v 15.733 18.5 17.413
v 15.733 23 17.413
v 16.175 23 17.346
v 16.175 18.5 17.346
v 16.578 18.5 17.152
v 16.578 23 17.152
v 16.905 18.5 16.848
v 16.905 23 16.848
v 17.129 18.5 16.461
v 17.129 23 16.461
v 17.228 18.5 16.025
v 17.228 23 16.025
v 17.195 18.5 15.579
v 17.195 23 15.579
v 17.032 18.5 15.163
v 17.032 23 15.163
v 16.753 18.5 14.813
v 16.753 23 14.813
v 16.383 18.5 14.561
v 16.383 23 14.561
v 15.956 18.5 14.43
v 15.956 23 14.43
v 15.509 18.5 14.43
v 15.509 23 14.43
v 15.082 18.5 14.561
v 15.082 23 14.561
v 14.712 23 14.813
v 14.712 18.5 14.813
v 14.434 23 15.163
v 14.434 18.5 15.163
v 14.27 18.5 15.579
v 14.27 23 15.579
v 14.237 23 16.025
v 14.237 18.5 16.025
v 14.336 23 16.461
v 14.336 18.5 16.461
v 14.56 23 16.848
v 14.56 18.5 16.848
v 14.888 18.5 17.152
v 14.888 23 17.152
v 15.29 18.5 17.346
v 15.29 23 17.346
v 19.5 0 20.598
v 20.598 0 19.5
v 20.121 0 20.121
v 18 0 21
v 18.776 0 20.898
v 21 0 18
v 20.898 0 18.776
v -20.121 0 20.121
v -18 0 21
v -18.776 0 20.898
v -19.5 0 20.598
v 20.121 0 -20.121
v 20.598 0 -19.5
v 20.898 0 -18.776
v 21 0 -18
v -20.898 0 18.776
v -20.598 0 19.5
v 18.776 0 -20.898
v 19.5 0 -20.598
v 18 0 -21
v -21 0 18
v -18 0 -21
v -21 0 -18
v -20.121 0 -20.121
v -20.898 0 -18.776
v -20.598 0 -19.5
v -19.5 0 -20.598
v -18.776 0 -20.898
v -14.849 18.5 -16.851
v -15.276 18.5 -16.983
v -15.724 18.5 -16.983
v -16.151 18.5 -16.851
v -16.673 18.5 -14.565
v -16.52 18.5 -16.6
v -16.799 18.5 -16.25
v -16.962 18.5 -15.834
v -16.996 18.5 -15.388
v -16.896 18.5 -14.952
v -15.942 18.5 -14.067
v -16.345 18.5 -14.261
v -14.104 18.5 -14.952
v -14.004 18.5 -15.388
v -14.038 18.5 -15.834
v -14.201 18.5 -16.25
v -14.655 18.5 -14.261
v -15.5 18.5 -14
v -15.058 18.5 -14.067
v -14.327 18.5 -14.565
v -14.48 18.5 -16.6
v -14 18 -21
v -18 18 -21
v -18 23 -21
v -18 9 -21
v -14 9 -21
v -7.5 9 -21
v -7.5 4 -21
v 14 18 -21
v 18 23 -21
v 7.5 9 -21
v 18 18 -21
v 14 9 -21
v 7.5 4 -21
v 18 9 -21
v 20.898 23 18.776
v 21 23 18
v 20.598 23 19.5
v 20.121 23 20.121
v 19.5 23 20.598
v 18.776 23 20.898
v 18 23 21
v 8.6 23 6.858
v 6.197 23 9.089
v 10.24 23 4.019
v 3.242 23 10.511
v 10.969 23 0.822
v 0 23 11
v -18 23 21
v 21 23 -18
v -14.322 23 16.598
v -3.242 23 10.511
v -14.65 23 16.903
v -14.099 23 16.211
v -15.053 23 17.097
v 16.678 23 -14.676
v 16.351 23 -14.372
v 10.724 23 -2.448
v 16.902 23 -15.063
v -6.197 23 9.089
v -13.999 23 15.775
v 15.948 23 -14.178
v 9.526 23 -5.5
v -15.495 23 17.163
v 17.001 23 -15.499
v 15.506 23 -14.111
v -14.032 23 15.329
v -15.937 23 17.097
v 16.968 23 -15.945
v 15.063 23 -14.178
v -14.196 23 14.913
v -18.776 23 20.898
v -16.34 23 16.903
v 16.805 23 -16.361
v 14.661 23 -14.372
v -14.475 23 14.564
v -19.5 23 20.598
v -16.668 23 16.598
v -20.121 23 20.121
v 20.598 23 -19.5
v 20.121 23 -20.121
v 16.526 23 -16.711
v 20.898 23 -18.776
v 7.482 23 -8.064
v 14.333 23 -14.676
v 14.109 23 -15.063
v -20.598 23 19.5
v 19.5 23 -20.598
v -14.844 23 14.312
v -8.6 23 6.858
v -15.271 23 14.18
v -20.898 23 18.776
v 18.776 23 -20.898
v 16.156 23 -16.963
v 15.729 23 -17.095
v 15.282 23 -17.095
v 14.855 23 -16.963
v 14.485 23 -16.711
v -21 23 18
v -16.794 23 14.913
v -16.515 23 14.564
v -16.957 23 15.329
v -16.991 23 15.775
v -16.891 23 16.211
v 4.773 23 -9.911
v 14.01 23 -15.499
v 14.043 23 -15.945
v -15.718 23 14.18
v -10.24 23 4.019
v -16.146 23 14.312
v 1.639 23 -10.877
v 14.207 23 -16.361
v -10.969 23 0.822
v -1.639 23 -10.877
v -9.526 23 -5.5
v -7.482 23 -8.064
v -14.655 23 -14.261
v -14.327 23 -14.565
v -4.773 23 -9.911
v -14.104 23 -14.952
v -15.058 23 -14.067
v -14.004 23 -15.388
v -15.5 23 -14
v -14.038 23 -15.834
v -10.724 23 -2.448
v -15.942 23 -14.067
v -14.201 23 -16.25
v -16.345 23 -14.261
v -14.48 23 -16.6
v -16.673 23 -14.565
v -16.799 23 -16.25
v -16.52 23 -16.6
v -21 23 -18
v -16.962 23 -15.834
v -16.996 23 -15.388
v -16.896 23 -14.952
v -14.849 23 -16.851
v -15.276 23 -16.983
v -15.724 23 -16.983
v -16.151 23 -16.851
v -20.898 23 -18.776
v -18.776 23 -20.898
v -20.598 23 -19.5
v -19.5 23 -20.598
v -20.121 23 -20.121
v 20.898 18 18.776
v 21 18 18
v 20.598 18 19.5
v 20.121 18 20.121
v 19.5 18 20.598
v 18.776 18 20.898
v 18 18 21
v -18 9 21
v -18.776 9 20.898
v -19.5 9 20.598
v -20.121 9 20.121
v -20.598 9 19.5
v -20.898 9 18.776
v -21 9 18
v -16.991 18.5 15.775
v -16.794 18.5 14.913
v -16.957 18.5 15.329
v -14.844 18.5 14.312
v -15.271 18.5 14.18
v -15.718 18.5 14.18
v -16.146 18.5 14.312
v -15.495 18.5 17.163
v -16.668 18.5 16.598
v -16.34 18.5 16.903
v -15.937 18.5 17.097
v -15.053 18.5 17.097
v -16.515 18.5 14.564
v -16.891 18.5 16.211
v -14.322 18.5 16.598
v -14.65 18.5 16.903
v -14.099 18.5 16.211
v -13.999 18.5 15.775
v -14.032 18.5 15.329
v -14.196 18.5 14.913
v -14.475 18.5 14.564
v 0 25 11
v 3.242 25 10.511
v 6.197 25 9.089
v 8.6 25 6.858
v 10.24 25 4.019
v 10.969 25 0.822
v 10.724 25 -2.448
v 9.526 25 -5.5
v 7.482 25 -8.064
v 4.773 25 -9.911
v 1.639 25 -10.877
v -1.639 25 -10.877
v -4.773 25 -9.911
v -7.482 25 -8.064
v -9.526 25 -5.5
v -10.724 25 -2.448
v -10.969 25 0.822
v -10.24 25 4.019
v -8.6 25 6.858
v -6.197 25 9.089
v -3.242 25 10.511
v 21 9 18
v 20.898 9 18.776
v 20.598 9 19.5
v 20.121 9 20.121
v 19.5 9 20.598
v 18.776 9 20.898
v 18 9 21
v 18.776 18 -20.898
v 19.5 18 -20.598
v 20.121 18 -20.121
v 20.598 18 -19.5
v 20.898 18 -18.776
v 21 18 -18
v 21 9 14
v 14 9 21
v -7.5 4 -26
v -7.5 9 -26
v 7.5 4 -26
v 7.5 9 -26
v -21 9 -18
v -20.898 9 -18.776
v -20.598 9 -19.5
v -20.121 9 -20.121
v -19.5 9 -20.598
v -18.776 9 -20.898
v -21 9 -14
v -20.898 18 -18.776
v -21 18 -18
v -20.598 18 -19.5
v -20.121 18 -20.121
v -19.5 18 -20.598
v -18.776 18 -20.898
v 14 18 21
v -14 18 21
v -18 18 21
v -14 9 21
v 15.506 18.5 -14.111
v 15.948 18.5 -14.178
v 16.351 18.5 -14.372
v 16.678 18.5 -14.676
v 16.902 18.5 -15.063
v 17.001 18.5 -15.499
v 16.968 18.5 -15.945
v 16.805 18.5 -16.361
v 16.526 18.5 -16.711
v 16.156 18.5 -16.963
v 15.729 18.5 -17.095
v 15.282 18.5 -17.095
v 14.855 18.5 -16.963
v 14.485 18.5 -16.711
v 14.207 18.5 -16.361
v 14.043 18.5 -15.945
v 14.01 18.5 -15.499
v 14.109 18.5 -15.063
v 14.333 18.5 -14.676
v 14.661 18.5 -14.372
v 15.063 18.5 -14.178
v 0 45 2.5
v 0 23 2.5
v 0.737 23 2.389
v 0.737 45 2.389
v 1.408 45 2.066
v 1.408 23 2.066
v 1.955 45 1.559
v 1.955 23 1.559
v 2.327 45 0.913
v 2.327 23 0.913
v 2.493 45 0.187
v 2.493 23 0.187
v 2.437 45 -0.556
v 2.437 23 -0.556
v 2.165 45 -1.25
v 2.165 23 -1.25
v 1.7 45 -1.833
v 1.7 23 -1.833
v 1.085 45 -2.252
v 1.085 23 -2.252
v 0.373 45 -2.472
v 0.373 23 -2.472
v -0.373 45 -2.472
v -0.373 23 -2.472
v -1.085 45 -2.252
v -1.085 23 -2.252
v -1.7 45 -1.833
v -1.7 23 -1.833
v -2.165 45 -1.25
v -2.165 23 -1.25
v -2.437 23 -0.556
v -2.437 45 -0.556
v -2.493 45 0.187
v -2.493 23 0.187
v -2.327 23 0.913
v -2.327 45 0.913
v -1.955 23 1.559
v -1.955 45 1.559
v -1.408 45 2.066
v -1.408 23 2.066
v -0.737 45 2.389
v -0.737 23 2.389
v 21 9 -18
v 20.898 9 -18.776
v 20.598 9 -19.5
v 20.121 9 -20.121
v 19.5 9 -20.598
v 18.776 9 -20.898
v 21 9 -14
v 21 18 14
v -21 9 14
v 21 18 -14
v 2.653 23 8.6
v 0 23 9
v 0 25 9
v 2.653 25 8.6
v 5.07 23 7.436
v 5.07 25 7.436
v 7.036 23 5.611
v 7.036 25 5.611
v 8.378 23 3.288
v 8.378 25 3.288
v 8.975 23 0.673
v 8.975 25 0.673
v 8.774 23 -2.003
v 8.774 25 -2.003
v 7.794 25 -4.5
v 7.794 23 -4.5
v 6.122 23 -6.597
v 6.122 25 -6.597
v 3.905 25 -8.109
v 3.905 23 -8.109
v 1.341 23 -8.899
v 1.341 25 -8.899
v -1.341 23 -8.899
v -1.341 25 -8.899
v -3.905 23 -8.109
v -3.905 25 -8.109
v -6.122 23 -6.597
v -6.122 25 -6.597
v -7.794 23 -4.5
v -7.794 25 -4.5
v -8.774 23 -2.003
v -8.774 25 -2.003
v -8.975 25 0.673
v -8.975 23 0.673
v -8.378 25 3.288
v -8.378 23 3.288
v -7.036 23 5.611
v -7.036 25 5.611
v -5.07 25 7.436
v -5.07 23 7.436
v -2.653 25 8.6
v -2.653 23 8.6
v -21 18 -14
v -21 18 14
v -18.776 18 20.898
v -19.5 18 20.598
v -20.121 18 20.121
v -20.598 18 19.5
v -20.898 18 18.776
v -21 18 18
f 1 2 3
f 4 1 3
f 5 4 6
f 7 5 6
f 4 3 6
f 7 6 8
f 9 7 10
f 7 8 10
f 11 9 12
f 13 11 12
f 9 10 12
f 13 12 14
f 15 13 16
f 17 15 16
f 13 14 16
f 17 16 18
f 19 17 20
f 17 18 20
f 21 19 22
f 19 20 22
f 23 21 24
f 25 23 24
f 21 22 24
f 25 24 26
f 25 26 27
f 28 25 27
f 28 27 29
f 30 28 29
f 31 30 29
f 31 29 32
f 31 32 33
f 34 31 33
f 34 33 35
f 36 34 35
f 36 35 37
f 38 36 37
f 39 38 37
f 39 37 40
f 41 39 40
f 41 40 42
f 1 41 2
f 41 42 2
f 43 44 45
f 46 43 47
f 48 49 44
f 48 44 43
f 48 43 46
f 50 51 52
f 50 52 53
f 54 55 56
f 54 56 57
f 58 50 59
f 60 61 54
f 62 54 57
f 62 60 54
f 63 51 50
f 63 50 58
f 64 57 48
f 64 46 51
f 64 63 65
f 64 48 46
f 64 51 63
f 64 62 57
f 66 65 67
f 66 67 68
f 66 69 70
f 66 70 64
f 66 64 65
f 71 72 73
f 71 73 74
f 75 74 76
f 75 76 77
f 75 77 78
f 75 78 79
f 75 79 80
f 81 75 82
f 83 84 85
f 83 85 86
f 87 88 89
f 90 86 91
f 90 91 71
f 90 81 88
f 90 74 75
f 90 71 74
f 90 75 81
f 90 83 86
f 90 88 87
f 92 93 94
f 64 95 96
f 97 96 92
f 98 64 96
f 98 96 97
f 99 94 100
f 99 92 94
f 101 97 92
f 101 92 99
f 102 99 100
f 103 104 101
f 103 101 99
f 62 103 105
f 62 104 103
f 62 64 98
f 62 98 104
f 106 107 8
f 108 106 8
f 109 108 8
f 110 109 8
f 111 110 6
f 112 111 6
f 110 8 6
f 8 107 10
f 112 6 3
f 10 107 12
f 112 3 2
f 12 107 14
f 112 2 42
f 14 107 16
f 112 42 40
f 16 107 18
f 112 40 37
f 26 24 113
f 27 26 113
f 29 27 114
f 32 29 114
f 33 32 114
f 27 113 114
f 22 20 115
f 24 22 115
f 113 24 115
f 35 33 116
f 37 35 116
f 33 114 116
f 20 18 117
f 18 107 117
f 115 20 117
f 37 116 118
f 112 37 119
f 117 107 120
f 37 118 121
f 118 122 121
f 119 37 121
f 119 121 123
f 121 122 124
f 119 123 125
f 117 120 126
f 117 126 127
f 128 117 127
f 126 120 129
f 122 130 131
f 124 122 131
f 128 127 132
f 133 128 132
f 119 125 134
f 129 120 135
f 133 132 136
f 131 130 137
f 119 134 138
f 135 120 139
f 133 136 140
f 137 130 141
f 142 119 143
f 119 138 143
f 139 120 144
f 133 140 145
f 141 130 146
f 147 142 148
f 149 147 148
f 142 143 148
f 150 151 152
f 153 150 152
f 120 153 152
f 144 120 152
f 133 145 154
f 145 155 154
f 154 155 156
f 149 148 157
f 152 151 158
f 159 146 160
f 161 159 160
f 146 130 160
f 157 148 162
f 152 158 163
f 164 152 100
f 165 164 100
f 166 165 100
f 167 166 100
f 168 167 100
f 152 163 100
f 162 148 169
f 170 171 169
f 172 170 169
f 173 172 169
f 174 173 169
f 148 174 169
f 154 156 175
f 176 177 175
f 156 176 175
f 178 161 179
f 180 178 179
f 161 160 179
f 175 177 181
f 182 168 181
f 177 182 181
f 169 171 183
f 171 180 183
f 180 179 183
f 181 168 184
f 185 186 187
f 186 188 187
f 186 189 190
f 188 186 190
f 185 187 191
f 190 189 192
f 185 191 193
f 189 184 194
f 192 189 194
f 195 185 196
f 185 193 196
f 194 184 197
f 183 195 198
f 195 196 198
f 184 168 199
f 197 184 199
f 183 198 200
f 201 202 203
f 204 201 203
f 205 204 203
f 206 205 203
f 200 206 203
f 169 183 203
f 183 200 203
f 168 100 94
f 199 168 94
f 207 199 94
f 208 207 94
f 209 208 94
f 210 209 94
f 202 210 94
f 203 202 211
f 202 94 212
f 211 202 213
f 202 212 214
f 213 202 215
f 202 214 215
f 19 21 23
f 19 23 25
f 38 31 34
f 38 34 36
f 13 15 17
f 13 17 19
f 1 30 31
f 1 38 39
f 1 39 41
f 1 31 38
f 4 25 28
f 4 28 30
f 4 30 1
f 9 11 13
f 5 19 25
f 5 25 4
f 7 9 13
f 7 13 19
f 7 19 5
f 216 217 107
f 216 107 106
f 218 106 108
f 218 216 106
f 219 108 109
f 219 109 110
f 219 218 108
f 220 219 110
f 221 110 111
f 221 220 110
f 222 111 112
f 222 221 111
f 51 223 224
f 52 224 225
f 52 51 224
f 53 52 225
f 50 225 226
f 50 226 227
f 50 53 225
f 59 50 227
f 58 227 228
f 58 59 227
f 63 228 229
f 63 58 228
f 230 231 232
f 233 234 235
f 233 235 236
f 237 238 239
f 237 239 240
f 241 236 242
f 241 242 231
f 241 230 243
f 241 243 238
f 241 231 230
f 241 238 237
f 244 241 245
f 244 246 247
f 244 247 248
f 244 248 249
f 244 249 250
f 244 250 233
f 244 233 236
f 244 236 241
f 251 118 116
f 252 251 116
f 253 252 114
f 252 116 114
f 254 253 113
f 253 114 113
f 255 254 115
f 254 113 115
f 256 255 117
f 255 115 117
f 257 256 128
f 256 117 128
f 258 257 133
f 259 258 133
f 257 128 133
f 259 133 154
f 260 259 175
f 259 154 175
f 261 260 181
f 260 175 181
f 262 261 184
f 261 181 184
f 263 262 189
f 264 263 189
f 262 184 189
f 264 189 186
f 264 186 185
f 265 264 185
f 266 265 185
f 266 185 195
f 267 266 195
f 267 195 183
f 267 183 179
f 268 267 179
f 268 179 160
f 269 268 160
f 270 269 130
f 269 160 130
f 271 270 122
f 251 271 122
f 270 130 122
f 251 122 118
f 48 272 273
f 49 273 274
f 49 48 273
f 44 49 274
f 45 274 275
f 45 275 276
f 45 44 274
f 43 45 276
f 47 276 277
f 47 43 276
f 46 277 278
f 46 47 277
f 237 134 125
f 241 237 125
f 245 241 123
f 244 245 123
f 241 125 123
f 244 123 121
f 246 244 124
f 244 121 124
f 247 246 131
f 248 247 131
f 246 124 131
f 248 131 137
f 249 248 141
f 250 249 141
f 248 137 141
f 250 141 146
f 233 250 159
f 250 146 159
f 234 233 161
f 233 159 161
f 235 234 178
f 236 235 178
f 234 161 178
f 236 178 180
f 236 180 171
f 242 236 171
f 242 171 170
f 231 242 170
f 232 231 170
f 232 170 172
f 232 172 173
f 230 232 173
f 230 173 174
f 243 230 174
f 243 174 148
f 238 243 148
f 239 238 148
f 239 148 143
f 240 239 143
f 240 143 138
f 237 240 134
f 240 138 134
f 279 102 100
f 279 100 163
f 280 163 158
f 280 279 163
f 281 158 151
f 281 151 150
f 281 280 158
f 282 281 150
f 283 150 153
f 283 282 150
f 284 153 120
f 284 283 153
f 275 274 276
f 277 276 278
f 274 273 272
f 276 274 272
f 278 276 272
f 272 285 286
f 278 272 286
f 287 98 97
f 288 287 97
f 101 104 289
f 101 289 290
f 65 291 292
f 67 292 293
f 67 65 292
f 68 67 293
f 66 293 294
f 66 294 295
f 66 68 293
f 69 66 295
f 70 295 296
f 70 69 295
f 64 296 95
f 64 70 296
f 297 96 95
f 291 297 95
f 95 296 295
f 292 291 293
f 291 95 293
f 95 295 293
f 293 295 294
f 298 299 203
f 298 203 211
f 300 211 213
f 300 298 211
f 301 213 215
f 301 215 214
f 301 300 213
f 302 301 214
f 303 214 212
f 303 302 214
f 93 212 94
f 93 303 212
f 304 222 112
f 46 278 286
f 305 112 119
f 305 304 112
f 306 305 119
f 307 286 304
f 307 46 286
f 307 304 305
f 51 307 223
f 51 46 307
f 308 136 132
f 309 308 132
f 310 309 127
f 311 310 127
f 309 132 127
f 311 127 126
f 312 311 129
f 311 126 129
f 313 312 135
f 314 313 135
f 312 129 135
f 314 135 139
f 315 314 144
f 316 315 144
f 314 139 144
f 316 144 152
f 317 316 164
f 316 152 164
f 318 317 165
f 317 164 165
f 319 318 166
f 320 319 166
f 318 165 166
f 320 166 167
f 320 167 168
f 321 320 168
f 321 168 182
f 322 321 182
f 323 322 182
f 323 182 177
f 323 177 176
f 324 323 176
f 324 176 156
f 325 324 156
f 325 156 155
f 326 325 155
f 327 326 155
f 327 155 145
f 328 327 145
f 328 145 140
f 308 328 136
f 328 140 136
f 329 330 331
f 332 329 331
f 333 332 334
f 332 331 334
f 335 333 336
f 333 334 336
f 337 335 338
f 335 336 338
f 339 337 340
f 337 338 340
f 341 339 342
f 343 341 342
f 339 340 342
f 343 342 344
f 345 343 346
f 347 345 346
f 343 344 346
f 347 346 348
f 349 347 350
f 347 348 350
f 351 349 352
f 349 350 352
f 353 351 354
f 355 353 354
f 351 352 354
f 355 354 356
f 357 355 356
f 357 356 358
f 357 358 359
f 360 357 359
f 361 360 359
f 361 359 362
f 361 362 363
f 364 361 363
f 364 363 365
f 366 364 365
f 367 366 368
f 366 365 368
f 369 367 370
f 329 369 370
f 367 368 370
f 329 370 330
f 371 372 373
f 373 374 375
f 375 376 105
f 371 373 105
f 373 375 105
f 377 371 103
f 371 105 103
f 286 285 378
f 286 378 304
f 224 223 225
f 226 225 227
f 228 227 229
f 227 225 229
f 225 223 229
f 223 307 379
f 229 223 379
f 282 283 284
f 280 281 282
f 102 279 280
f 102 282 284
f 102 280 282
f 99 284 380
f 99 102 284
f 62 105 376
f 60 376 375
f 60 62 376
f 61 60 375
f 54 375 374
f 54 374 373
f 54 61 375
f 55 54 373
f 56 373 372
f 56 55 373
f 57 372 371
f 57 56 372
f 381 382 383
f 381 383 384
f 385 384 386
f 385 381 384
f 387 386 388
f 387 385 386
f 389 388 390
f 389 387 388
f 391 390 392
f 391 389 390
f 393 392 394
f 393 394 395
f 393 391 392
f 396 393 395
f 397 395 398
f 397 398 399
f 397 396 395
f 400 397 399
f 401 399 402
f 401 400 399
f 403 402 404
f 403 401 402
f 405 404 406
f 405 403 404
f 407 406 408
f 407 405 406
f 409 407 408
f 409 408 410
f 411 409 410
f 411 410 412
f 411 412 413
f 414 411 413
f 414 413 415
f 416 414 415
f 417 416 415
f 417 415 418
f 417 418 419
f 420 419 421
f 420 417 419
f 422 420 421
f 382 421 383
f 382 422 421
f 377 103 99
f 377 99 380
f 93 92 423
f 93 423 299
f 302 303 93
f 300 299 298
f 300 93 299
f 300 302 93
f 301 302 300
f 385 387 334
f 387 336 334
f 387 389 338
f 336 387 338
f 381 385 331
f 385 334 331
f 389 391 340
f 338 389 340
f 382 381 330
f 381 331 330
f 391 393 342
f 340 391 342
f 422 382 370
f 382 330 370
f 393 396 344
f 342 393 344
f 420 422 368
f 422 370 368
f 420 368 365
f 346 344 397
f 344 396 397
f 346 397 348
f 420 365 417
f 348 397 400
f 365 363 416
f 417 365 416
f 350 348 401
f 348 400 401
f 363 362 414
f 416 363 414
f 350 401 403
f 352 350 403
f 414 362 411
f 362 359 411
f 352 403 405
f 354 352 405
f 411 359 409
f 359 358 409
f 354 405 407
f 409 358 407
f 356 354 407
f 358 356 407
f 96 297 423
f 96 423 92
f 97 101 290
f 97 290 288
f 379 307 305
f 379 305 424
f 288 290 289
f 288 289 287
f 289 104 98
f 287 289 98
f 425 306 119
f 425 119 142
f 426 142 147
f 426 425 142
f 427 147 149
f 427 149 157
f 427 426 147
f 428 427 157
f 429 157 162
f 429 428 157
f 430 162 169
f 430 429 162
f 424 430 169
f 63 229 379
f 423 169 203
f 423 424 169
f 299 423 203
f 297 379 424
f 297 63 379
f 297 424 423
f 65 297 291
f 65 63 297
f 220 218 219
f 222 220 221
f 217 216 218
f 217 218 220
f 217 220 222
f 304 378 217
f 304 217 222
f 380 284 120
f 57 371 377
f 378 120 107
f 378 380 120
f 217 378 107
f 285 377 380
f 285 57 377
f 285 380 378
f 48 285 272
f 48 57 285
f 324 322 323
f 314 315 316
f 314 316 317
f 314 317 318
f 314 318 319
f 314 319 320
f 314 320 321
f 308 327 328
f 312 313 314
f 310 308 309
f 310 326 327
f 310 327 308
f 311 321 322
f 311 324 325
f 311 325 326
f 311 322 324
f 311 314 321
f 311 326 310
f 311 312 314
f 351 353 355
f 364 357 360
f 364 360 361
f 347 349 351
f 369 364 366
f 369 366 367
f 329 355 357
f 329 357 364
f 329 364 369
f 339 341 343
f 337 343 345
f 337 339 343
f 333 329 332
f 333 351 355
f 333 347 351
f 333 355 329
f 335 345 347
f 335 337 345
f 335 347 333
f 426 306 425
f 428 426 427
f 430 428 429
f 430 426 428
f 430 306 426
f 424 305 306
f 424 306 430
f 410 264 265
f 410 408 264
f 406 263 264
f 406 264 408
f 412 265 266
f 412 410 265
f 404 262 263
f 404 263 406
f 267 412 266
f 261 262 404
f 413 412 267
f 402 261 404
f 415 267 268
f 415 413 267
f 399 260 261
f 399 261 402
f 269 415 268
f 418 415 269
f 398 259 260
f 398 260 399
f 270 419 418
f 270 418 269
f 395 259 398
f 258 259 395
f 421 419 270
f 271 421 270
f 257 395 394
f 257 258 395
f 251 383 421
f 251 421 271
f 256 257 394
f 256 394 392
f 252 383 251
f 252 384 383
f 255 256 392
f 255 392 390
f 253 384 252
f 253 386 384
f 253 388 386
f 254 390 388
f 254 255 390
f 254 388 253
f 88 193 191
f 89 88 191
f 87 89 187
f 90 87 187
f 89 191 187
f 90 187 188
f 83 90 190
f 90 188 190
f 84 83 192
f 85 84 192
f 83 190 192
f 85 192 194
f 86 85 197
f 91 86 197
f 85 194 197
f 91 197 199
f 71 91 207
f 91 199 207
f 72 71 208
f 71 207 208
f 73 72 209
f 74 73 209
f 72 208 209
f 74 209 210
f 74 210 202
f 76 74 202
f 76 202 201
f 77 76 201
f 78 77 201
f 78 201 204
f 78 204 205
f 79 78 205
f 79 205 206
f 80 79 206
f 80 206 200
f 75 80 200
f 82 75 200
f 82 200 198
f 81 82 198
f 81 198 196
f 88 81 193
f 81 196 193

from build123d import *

# Parameters (mm, degrees)
BOSS_EXTRUDE1_DEPTH = 9
BOSS_EXTRUDE2_DEPTH = 9
BOSS_EXTRUDE3_DEPTH = 5
SKETCH5_R           = 11
SKETCH5_R_2         = 9
BOSS_EXTRUDE4_DEPTH = 2
SKETCH6_R           = 2.5
BOSS_EXTRUDE5_DEPTH = 22
SKETCH7_R           = 1.5
CUT_EXTRUDE1_DEPTH  = 4.5
SKETCH9_W           = 15
SKETCH9_H           = 5
BOSS_EXTRUDE6_DEPTH = 5


with BuildPart() as part:
    # Sketch2 → Boss-Extrude1 (new body)
    with BuildSketch(Plane(origin=(0, 0, 0), x_dir=(1, 0, 0), z_dir=(0, 1, 0))):
        with BuildLine():
            Line((-18, 21), (18, 21))
            ThreePointArc((18, 21), (20.121320344, 20.121320344), (21, 18))
            Line((21, 18), (21, -18))
            ThreePointArc((21, -18), (20.121320344, -20.121320344), (18, -21))
            Line((18, -21), (-18, -21))
            ThreePointArc((-18, -21), (-20.121320344, -20.121320344), (-21, -18))
            Line((-21, -18), (-21, 18))
            ThreePointArc((-21, 18), (-20.121320344, 20.121320344), (-18, 21))
        make_face()
    extrude(amount=BOSS_EXTRUDE1_DEPTH)

    # Sketch3 → Boss-Extrude2 (add)
    with BuildSketch(Plane(origin=(0, 9, 0), x_dir=(1, 0, 0), z_dir=(0, 1, 0))):
        Polygon((-21, 14), (-14, 21), (14, 21), (21, 14), (21, -14), (14, -21), (-14, -21), (-21, -14), align=None)
    extrude(amount=BOSS_EXTRUDE2_DEPTH)

    # Sketch4 → Boss-Extrude3 (add)
    with BuildSketch(Plane(origin=(0, 18, 0), x_dir=(1, 0, 0), z_dir=(0, 1, 0))):
        with BuildLine():
            Line((-18, 21), (18, 21))
            ThreePointArc((18, 21), (20.121320344, 20.121320344), (21, 18))
            Line((21, 18), (21, -18))
            ThreePointArc((21, -18), (20.121320344, -20.121320344), (18, -21))
            Line((18, -21), (-18, -21))
            ThreePointArc((-18, -21), (-20.121320344, -20.121320344), (-21, -18))
            Line((-21, -18), (-21, 18))
            ThreePointArc((-21, 18), (-20.121320344, 20.121320344), (-18, 21))
        make_face()
    extrude(amount=BOSS_EXTRUDE3_DEPTH)

    # Sketch5 → Boss-Extrude4 (add)
    with BuildSketch(Plane(origin=(0, 23, 0), x_dir=(1, 0, 0), z_dir=(0, 1, 0))):
        with Locations(Location((0, 0, 0), (0, 0, 270))):
            Circle(SKETCH5_R)
        with Locations(Location((0, 0, 0), (0, 0, 270))):
            Circle(SKETCH5_R_2, mode=Mode.SUBTRACT)
    extrude(amount=BOSS_EXTRUDE4_DEPTH)

    # Sketch6 → Boss-Extrude5 (add)
    with BuildSketch(Plane(origin=(0, 23, 0), x_dir=(1, 0, 0), z_dir=(0, 1, 0))):
        with Locations(Location((0, 0, 0), (0, 0, 270))):
            Circle(SKETCH6_R)
    extrude(amount=BOSS_EXTRUDE5_DEPTH)

    # Sketch7 → Cut-Extrude1 (cut)
    with BuildSketch(Plane(origin=(0, 23, 0), x_dir=(1, 0, 0), z_dir=(0, 1, 0))):
        with Locations(Location((-15.5, 15.5, 0), (0, 0, 270))):
            Circle(SKETCH7_R)
        with Locations(Location((15.505550331, 15.61144176, 0), (0, 0, 270))):
            Circle(SKETCH7_R)
        with Locations(Location((15.732618971, -15.912931541, 0), (0, 0, 270))):
            Circle(SKETCH7_R)
        with Locations(Location((-15.494867745, -15.663236697, 0), (0, 0, 270))):
            Circle(SKETCH7_R)
    extrude(amount=-CUT_EXTRUDE1_DEPTH, mode=Mode.SUBTRACT)

    # Sketch9 → Boss-Extrude6 (add)
    with BuildSketch(Plane(origin=(0, 0, -21), x_dir=(-1, 0, 0), z_dir=(0, 0, -1))):
        with Locations((0, 6.5)):
            Rectangle(SKETCH9_W, SKETCH9_H)
    extrude(amount=BOSS_EXTRUDE6_DEPTH)


solid = part.part
